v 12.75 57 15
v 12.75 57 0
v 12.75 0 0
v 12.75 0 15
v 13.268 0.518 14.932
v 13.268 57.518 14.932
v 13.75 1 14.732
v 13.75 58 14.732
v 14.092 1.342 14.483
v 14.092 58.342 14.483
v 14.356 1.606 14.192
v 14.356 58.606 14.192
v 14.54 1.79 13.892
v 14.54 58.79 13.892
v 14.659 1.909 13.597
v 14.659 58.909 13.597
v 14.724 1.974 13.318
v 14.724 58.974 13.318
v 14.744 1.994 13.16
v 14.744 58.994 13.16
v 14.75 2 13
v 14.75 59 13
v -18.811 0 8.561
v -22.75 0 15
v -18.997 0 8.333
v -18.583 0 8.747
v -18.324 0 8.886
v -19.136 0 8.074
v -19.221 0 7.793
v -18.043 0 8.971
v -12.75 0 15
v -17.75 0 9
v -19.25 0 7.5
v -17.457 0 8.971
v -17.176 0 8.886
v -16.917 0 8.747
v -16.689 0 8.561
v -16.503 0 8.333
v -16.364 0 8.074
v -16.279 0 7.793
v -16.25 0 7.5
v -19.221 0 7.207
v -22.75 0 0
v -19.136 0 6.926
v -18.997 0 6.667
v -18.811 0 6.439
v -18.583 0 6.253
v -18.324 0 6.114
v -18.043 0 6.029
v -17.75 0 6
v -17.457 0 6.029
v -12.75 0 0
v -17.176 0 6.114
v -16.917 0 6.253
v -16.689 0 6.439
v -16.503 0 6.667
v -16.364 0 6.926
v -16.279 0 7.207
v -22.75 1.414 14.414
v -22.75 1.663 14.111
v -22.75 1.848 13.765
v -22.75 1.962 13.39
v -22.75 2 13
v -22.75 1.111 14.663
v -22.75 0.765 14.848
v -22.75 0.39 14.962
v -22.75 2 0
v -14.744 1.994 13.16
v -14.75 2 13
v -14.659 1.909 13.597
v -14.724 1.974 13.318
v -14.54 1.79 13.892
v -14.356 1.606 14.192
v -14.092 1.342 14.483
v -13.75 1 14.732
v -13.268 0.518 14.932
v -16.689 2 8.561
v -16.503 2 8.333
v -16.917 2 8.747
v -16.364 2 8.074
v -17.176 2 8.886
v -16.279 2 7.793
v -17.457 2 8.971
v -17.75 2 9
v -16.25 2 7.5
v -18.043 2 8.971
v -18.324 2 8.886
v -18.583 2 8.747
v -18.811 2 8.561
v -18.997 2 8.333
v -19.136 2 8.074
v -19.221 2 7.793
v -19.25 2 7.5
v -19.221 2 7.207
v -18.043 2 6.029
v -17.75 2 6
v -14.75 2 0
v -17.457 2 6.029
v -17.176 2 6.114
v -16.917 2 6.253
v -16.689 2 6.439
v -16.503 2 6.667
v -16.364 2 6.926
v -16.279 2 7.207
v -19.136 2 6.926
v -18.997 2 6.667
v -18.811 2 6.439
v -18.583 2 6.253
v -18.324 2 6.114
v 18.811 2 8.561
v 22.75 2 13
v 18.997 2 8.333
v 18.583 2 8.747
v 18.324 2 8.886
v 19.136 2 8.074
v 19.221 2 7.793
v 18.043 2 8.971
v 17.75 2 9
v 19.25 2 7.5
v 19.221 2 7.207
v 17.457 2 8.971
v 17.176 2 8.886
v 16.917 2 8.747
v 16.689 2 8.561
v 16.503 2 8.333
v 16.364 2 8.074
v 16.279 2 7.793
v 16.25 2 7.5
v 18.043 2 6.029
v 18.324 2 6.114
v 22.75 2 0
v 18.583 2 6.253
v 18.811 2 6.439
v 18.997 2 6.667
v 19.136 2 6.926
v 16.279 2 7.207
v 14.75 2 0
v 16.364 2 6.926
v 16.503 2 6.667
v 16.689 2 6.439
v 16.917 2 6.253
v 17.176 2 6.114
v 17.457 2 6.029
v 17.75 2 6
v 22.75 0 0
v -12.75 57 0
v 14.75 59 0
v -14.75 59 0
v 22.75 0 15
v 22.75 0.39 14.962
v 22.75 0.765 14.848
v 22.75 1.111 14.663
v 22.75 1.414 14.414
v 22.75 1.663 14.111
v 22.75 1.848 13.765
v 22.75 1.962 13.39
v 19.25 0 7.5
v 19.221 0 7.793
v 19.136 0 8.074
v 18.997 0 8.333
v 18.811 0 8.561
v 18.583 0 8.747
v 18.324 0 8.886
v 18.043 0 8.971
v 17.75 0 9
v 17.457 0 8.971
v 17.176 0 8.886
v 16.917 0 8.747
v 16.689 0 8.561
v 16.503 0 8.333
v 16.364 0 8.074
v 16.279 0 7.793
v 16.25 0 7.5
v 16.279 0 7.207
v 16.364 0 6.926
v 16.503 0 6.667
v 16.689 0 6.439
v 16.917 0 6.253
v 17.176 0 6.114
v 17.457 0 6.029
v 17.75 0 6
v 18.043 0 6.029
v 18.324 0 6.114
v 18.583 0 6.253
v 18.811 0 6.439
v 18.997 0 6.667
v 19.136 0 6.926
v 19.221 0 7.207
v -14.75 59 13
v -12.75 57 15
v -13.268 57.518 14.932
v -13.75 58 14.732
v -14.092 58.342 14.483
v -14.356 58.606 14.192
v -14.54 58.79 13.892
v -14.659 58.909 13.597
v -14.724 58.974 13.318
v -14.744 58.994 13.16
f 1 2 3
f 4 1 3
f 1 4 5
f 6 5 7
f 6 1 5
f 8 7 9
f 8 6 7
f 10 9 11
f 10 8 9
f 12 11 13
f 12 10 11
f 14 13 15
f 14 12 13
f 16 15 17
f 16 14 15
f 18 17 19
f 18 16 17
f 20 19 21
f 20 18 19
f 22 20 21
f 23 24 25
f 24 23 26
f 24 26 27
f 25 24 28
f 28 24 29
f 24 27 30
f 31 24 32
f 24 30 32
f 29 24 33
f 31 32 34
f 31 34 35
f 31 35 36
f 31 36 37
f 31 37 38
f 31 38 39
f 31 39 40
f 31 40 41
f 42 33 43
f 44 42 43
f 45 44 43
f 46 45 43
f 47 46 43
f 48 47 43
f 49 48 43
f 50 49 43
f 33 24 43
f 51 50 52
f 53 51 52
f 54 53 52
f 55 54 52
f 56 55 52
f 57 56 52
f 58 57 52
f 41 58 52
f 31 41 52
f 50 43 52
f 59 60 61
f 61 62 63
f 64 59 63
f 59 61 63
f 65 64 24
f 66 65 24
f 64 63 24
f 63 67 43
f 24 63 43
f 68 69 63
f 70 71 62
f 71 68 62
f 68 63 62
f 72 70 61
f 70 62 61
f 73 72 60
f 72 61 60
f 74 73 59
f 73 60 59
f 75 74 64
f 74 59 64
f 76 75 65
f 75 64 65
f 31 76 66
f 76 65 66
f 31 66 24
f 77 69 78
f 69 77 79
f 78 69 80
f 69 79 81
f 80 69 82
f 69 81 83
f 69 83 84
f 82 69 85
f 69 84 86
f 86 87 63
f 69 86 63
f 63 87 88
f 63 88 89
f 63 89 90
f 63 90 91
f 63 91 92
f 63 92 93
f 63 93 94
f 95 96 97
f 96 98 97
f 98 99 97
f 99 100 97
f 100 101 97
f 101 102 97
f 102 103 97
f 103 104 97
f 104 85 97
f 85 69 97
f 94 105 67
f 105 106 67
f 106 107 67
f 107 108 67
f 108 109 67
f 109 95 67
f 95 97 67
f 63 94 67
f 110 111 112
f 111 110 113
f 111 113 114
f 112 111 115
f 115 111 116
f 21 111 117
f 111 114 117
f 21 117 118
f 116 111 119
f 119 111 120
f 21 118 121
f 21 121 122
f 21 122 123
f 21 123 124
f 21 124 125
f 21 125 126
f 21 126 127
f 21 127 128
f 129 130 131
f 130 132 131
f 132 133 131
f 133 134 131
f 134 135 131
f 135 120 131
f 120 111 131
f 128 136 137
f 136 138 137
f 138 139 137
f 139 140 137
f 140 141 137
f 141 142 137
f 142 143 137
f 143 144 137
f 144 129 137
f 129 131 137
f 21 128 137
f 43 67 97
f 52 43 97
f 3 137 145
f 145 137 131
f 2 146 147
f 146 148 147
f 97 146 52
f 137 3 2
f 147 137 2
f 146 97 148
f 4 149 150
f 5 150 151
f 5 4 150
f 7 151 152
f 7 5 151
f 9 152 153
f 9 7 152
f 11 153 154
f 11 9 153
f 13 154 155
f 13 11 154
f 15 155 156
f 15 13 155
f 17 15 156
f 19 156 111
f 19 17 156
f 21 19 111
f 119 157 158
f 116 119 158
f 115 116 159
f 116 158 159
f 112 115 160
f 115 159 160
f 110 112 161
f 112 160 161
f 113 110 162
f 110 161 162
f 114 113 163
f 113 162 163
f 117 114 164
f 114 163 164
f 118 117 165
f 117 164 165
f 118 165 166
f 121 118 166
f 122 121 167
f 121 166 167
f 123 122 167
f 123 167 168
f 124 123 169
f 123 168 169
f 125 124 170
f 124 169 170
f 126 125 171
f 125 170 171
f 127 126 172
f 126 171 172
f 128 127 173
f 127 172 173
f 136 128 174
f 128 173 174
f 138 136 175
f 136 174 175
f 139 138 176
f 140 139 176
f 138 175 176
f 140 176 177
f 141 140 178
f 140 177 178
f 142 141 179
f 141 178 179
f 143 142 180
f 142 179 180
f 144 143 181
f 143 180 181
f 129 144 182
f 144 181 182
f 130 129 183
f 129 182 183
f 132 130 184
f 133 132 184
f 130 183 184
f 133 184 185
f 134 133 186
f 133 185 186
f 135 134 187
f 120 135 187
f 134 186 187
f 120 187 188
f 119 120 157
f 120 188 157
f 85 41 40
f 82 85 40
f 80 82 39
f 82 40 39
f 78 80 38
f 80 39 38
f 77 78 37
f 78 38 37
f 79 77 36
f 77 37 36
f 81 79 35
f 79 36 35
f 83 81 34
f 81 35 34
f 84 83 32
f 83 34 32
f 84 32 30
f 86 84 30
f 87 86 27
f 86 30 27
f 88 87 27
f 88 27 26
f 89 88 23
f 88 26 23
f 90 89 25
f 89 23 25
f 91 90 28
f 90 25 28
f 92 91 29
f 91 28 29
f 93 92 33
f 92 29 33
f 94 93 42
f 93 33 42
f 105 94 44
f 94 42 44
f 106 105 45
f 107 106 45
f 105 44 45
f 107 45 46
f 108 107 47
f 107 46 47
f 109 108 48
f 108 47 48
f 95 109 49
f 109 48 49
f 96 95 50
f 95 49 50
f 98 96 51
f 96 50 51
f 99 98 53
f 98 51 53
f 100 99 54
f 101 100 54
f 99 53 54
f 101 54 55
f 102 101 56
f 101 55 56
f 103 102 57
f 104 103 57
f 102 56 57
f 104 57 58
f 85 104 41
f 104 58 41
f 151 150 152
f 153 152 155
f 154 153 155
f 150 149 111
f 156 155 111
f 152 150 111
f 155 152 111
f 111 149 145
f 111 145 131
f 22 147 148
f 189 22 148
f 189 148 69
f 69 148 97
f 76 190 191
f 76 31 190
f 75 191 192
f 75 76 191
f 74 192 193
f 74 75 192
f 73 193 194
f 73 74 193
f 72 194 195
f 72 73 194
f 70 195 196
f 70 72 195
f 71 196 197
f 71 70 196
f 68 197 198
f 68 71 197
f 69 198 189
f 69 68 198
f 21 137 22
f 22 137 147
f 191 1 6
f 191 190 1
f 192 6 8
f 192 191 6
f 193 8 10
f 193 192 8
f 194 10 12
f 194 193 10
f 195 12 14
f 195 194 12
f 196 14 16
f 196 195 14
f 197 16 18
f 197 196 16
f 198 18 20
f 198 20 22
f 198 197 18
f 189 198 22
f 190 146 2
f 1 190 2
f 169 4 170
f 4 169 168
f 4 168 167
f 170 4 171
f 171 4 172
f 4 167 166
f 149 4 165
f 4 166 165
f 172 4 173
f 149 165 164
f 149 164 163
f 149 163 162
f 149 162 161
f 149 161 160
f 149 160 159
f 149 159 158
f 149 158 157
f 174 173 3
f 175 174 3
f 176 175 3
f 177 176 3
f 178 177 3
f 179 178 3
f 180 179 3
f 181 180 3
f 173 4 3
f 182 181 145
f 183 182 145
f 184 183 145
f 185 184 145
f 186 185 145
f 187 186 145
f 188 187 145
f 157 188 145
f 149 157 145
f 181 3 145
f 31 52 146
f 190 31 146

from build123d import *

# Parameters (mm, degrees)
F1_DEPTH = 15
F2_R     = 1.5
F3_DEPTH = 2
F4_R     = 1.99999


# Not quite as in the source:
# - a fillet or chamfer is up to 0.001 mm smaller than in the source, because OpenCascade refuses the exact size


with BuildPart() as f1:
    # F0 (on Top) → F1 (new body)
    with BuildSketch(Plane.XY):
        Polygon((-22.75, 2), (-22.75, 0), (-12.75, 0), (-12.75, 57), (0, 57), (12.75, 57), (12.75, 0), (22.75, 0), (22.75, 2), (14.75, 2), (14.75, 59), (0, 59), (-14.75, 59), (-14.75, 2), align=None)
    extrude(amount=F1_DEPTH)

    # F2 (on Front) → F3 (cut)
    with BuildSketch(Plane.XZ):
        with Locations((-17.75, 7.5)):
            Circle(F2_R)
        with Locations((17.75, 7.5)):
            Circle(F2_R)
    extrude(amount=-F3_DEPTH, mode=Mode.SUBTRACT)

    # F4 (radius 2 in the source; OpenCascade refuses exactly that, so slightly less here)
    f4_edges = [f1.edges().sort_by_distance(p)[0] for p in [
        (-14.75, 30.5, 15),
        (0, 59, 15),
        (14.75, 30.5, 15),
        (18.75, 2, 15),
        (-18.75, 2, 15),
    ]]
    fillet(f4_edges, radius=F4_R)


solid = f1.part
